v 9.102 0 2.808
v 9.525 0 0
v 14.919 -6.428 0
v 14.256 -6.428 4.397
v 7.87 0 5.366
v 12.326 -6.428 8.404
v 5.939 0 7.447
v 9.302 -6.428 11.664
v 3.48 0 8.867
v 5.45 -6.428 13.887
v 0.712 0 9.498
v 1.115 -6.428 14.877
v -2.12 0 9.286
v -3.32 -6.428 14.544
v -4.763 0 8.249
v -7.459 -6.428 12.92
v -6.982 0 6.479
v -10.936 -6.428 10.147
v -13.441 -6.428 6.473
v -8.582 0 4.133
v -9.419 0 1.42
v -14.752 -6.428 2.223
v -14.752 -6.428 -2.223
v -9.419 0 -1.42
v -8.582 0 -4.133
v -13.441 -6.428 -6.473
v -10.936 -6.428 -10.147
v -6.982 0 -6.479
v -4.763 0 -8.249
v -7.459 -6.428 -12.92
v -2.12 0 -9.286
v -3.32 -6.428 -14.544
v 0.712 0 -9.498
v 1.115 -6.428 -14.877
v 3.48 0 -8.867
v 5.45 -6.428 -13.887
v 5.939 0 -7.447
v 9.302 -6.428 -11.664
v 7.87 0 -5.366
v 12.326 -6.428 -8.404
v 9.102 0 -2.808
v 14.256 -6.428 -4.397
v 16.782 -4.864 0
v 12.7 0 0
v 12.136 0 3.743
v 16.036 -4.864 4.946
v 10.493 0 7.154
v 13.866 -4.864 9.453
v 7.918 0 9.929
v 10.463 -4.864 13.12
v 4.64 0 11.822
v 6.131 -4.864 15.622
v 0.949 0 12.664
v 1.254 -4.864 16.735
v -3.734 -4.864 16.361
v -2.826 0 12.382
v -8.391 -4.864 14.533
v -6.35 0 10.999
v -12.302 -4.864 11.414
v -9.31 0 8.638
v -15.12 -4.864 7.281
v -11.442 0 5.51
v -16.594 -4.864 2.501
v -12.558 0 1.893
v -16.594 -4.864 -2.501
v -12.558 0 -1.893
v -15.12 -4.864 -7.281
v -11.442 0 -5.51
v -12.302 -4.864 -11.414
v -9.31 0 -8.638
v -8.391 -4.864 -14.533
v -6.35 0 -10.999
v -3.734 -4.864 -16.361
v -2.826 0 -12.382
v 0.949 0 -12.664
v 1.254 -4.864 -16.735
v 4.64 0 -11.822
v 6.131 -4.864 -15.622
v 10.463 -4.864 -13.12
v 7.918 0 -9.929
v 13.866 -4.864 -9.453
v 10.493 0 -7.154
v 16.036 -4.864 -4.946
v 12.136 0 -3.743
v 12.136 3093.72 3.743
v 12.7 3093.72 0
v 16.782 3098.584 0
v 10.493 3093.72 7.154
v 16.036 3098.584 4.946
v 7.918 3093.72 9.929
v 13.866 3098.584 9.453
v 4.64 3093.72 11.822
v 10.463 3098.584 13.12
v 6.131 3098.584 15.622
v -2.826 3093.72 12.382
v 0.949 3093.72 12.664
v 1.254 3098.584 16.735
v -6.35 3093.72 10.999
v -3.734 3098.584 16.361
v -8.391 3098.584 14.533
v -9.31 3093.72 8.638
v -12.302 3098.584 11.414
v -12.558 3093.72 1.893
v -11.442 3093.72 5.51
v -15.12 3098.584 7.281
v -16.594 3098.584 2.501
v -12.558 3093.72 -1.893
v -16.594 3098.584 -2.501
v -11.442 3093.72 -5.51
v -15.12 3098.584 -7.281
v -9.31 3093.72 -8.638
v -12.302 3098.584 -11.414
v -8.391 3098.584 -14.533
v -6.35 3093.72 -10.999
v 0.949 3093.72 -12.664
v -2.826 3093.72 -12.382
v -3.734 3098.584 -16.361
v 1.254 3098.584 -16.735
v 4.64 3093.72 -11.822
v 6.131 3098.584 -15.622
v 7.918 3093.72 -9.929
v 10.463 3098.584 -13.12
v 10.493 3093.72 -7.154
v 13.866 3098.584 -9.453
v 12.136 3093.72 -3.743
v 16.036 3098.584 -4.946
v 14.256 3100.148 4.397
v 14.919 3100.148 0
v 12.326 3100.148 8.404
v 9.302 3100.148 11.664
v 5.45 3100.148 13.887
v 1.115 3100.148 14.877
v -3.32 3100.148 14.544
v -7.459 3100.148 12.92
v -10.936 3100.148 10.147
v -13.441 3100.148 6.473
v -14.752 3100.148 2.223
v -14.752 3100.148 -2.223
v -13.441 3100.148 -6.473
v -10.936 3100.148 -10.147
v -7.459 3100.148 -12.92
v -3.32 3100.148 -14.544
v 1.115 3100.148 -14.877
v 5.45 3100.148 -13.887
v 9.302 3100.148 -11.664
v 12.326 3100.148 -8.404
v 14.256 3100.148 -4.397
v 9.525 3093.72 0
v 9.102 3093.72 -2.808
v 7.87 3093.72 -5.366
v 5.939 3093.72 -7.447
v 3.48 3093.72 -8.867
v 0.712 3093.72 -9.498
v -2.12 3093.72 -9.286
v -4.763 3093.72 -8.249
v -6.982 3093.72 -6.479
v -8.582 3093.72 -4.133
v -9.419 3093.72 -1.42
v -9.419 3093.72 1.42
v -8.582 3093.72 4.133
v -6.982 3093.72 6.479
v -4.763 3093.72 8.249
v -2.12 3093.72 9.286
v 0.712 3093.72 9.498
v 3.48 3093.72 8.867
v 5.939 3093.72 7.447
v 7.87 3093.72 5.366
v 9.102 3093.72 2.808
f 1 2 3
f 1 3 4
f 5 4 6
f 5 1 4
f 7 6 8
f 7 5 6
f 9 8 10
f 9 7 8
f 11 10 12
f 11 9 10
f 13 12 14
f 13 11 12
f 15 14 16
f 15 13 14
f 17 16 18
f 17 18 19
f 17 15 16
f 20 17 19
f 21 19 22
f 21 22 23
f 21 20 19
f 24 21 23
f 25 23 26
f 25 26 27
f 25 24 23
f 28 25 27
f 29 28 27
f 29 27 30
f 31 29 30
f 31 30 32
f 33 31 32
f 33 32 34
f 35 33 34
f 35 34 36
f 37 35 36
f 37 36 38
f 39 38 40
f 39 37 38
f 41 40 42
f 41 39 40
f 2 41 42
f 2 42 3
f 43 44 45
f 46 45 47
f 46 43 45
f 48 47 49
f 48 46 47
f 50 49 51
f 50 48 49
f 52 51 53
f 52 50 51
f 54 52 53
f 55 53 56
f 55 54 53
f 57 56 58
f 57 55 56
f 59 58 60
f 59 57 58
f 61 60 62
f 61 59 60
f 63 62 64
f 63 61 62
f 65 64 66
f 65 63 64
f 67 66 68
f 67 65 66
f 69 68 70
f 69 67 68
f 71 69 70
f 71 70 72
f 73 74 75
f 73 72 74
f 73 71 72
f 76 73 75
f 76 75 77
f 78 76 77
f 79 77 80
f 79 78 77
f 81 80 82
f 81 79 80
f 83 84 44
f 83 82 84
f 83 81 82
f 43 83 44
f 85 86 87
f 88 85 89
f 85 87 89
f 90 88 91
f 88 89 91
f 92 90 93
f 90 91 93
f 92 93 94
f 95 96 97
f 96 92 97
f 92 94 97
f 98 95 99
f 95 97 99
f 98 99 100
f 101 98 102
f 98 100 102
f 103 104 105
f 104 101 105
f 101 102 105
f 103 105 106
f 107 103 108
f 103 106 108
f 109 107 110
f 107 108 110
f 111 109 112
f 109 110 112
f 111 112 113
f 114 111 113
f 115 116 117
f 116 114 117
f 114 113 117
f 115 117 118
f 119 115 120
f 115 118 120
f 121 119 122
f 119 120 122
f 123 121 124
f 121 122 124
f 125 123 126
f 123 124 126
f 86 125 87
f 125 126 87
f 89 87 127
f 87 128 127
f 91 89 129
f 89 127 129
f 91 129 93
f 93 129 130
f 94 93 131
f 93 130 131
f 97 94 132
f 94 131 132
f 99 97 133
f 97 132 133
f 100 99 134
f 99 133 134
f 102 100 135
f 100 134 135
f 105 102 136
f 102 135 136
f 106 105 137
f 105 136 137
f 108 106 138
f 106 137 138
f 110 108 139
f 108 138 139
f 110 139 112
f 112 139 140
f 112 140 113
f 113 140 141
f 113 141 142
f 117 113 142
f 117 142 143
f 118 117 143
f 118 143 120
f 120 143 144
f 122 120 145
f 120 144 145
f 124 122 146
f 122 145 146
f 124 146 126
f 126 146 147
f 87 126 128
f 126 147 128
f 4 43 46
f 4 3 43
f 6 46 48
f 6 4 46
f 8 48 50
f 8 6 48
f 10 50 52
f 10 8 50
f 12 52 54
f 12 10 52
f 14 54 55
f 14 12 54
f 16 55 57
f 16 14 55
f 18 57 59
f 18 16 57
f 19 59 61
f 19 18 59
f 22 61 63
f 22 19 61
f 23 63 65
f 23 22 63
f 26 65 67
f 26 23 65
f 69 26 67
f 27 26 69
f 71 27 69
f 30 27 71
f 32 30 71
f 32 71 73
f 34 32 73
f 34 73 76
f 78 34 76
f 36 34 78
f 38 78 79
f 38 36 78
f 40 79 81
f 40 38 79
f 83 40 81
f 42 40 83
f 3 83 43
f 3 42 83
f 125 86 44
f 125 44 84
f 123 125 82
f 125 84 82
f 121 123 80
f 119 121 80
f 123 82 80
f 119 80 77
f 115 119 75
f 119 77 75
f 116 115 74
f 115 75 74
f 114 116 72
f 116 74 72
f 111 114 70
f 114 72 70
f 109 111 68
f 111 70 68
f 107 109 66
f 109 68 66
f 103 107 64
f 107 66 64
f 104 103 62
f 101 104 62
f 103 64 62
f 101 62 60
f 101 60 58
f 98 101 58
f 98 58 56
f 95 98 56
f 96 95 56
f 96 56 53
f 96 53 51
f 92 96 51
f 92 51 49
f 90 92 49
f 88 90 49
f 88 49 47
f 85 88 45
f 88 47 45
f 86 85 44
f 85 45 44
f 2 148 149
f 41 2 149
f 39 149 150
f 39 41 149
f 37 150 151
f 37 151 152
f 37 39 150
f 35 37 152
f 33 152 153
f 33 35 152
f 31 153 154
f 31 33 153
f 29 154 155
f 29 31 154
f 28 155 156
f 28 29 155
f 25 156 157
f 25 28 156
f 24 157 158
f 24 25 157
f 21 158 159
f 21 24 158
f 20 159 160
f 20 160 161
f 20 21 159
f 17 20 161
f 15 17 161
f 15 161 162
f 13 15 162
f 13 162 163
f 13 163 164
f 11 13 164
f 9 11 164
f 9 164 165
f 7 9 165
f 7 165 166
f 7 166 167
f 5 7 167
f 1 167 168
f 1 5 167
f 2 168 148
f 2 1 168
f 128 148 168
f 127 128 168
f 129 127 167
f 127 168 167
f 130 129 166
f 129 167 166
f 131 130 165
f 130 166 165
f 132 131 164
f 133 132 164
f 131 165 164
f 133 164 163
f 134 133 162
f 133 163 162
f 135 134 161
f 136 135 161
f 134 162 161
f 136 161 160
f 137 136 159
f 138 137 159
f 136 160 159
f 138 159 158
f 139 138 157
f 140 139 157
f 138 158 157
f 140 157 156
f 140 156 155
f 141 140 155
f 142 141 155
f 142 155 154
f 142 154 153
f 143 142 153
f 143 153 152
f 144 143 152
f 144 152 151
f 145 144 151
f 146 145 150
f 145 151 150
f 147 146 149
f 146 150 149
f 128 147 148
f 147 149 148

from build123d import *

# Parameters (mm, degrees)
SKETCH1_R           = 12.7
SKETCH1_R_2         = 9.525
BOSS_EXTRUDE1_DEPTH = 3093.72


with BuildPart() as part:
    # Sketch1 → Boss-Extrude1 (new body)
    with BuildSketch(Plane(origin=(0, 0, 0), x_dir=(1, 0, 0), z_dir=(0, 1, 0))):
        Circle(SKETCH1_R)
        Circle(SKETCH1_R_2, mode=Mode.SUBTRACT)
    extrude(amount=BOSS_EXTRUDE1_DEPTH)

    # Sketch2 → Revolve1 (revolve)
    with BuildSketch(Plane.XY):
        Polygon((12.7, 3093.72), (16.781701322, 3098.584382214), (14.918534839, 3100.147764522), (9.525, 3093.72), align=None)
    revolve1 = revolve(axis=Axis((0, 3248.406, 0), (0, -1, 0)))

    # Mirror1: Revolve1 across plane
    add(revolve1.mirror(Plane.ZX.offset(1546.86)))


solid = part.part
